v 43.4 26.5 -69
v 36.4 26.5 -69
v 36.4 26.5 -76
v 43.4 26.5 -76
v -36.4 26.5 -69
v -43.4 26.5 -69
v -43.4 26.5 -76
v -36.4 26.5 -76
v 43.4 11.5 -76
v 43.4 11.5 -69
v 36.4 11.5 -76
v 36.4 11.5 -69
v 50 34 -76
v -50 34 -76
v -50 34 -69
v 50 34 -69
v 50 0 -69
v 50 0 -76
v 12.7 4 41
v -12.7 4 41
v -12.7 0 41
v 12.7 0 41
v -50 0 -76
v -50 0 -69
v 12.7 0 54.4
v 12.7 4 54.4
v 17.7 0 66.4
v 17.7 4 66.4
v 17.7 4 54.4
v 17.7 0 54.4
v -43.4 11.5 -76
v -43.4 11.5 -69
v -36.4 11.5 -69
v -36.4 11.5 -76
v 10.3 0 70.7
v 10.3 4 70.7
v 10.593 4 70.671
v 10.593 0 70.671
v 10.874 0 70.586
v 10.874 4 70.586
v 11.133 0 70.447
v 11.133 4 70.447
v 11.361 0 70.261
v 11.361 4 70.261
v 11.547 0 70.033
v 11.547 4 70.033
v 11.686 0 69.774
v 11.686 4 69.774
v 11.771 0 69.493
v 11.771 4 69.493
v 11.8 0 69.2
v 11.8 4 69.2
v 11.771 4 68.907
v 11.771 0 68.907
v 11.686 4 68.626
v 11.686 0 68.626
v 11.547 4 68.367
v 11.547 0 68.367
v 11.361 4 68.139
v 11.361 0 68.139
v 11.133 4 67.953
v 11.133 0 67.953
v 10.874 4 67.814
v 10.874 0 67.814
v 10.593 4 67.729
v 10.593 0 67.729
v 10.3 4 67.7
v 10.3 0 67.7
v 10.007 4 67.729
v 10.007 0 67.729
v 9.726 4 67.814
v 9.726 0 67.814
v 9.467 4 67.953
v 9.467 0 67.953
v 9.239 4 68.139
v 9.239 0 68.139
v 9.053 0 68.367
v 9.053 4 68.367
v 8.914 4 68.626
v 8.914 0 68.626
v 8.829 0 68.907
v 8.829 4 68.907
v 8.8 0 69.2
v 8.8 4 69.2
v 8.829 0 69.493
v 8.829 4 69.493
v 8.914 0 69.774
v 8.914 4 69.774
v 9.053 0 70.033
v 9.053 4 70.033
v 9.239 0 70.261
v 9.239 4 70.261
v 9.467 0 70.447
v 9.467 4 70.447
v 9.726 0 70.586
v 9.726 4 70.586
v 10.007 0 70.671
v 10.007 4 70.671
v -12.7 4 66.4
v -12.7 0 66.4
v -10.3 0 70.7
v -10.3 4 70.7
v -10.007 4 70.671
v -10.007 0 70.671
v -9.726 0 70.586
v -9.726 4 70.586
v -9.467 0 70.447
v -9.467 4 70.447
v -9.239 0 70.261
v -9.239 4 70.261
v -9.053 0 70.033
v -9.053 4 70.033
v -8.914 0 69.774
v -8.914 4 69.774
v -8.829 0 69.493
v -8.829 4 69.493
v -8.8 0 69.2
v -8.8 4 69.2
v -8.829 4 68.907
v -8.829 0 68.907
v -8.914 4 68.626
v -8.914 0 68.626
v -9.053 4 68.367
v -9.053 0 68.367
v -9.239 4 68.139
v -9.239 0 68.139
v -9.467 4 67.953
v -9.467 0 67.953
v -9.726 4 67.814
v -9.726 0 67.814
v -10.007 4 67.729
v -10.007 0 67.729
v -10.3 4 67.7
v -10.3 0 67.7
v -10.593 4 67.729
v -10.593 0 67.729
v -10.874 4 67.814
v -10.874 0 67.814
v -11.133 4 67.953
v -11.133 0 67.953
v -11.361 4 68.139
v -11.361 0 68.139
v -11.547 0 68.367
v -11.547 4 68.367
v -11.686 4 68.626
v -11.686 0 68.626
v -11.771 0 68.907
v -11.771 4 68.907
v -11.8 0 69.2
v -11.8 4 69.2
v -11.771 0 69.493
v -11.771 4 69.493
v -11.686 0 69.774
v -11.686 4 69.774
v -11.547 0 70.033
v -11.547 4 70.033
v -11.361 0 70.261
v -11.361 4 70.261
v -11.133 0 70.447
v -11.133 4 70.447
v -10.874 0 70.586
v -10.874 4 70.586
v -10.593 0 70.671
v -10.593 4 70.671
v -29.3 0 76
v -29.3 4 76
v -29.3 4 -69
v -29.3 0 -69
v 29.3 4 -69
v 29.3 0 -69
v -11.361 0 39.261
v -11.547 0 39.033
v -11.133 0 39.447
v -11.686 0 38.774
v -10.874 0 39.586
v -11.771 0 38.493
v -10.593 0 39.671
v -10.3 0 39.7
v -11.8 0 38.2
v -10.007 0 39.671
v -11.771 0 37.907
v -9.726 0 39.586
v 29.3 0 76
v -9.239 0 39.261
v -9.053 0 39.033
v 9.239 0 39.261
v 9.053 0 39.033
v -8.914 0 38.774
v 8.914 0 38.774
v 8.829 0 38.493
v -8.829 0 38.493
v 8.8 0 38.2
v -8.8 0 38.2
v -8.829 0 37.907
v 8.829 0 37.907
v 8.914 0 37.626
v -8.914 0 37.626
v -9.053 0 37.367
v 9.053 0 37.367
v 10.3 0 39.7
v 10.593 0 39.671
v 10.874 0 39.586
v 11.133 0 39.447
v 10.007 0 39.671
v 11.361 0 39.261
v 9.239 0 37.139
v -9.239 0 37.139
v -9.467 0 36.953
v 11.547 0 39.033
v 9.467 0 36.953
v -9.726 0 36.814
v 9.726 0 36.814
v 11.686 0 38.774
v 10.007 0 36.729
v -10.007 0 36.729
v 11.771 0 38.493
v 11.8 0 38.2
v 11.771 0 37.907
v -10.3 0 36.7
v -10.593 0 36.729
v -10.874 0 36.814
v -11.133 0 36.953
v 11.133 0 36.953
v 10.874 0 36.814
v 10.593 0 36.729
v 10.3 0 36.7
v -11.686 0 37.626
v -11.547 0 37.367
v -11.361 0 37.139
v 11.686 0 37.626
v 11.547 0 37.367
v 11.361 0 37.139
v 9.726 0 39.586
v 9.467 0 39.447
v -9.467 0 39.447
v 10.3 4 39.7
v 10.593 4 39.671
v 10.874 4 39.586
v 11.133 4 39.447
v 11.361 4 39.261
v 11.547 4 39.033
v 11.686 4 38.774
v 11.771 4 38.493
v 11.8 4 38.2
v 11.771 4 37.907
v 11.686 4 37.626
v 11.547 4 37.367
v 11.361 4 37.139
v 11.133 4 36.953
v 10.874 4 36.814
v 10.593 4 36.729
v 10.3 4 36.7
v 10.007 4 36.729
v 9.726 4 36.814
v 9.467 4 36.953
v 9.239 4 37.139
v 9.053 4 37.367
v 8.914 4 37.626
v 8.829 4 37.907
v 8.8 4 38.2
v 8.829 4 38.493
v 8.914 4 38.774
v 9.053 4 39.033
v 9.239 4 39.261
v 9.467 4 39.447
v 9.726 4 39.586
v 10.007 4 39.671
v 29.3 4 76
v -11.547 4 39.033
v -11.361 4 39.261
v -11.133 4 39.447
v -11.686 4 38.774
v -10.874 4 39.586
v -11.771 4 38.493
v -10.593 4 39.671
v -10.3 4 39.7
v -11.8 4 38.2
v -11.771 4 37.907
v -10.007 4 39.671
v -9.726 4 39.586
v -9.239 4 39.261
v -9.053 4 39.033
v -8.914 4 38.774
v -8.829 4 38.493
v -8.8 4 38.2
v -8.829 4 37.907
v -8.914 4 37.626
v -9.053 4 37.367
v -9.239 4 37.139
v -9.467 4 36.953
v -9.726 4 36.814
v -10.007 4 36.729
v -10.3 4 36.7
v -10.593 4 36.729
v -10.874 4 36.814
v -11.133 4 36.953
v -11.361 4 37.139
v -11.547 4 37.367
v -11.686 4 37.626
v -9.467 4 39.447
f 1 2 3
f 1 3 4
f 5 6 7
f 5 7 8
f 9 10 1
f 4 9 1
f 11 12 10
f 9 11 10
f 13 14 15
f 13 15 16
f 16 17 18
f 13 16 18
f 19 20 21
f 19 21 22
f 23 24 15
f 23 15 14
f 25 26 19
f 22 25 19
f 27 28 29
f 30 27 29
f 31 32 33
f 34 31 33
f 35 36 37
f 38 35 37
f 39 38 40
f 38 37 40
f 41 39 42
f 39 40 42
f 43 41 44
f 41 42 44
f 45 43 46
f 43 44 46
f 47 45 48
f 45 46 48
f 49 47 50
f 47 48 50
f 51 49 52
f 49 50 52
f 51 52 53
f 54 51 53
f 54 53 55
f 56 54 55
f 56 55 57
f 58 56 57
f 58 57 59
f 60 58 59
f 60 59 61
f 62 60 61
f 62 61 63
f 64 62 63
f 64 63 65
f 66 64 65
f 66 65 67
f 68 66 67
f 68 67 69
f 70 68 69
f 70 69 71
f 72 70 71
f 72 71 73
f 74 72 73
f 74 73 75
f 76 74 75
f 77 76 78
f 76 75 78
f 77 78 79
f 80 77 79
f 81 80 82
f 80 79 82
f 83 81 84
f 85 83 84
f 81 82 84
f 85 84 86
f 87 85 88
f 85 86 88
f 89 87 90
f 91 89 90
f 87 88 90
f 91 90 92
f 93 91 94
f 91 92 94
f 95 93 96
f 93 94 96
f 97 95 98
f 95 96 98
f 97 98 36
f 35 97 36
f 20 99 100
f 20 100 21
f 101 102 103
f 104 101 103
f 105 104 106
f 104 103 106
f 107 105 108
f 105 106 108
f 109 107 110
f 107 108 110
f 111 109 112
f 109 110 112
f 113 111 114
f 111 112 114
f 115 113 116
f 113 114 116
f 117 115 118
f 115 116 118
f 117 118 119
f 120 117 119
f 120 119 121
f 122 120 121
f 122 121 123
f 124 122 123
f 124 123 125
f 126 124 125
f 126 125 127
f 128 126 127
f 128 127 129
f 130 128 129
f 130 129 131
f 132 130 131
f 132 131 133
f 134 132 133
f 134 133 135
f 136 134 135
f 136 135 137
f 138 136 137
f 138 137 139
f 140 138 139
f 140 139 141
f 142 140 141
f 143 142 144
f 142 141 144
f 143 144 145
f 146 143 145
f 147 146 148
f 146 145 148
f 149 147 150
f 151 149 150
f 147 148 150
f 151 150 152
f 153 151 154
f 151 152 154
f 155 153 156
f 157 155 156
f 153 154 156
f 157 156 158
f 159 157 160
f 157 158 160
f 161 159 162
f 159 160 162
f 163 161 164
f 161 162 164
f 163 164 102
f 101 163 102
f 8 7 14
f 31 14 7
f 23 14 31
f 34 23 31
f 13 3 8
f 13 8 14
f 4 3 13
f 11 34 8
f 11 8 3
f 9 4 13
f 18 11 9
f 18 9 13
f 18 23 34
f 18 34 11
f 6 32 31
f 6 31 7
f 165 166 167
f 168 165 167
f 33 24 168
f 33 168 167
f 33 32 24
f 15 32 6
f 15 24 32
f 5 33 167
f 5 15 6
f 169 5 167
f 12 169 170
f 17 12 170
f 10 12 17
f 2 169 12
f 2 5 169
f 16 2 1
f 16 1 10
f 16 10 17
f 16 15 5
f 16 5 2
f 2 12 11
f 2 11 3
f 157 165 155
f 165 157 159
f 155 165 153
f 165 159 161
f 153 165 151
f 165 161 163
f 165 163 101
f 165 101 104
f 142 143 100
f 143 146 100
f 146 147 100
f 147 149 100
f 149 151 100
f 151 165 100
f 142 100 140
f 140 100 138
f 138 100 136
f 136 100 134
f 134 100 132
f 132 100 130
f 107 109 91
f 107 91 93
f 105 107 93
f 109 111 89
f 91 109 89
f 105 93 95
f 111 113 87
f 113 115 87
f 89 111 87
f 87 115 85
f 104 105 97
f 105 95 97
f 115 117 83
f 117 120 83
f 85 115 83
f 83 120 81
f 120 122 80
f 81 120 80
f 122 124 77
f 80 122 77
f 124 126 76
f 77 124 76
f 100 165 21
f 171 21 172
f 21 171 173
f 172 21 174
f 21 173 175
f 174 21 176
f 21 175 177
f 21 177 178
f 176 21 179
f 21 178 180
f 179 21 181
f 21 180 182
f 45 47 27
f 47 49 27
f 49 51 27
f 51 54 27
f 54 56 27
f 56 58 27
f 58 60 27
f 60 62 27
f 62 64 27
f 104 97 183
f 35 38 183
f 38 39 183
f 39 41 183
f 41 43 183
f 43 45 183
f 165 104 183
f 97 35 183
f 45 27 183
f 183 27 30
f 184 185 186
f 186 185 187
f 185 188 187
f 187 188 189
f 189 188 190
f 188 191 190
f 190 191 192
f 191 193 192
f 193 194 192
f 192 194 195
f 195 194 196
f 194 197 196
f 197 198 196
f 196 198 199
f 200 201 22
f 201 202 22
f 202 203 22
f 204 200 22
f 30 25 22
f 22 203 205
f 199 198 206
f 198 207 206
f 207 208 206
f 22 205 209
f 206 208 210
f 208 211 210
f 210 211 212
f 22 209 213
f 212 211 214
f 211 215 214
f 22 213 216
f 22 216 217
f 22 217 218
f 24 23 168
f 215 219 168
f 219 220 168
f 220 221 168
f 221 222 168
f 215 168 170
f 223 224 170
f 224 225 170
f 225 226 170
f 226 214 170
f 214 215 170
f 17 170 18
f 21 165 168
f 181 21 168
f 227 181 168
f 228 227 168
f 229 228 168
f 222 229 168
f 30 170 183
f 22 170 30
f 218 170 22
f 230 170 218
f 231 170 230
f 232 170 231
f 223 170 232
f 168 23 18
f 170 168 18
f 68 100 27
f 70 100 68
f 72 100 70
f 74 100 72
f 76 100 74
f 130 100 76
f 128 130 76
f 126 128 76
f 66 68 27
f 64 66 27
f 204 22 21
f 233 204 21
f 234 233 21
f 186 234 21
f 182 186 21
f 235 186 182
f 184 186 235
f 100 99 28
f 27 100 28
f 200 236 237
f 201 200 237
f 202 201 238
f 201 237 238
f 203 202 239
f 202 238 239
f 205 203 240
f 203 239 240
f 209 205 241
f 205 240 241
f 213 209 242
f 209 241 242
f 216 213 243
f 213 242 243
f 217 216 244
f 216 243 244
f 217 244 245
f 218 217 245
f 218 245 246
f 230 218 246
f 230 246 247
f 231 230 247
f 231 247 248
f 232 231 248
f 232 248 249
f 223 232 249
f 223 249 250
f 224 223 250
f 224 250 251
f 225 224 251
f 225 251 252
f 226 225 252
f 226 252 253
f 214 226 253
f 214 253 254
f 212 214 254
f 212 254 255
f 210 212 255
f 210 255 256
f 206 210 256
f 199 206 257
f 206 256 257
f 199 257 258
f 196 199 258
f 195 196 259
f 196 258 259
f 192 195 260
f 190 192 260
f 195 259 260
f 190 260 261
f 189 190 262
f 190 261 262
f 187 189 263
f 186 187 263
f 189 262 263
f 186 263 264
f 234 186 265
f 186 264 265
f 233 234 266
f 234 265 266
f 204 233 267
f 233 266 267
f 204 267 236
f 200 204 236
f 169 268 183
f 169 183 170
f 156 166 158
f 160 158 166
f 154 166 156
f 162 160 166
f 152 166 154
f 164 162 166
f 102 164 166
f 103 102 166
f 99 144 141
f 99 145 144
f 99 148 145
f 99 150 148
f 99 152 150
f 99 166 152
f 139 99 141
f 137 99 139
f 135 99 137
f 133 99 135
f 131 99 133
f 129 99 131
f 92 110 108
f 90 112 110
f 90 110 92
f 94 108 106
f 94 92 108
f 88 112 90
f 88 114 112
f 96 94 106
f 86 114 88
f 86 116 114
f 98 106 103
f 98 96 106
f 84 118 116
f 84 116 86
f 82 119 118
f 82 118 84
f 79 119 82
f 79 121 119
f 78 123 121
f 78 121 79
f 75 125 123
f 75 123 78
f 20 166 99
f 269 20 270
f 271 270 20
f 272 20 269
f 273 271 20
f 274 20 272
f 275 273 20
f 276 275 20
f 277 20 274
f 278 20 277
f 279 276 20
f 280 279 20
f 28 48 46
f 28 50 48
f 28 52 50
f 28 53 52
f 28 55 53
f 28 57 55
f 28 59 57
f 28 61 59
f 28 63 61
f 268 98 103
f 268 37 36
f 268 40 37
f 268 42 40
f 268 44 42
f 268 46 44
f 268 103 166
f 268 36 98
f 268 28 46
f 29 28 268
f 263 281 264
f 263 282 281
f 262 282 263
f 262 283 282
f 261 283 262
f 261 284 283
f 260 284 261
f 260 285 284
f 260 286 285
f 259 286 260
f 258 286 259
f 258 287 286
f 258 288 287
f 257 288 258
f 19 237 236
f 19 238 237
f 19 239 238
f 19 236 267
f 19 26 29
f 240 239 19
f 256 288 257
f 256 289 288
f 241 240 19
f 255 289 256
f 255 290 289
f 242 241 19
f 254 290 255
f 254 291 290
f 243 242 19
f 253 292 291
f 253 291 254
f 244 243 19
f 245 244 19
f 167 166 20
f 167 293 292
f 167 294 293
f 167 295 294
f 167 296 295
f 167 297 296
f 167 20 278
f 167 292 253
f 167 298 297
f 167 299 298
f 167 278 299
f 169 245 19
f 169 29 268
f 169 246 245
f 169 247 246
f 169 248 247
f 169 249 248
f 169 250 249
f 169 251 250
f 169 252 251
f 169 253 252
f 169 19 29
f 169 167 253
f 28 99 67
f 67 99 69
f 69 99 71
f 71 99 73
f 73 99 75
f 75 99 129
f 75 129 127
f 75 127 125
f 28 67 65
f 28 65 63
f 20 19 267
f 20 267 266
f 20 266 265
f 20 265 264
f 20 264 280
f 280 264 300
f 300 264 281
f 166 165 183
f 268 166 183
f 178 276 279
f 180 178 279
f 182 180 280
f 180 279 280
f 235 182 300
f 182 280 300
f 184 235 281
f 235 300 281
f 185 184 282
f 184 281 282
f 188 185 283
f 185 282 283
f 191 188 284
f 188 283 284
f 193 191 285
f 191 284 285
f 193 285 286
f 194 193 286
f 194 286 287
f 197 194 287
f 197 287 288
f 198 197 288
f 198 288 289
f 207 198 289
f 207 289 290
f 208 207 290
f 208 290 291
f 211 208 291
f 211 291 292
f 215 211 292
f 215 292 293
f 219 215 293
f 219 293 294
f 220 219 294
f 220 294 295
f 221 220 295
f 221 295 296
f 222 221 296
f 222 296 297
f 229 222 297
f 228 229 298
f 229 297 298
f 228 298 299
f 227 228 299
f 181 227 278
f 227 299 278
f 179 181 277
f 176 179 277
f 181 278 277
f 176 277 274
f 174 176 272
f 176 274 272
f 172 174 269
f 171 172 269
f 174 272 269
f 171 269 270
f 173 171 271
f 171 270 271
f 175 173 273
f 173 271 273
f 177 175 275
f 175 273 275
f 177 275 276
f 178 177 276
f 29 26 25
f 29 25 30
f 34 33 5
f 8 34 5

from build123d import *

# Parameters (mm, degrees)
SKETCH1_W           = 100
SKETCH1_H           = 152
BOSS_EXTRUDE1_DEPTH = 34
SKETCH2_W           = 100
SKETCH2_H           = 145
CUT_EXTRUDE1_DEPTH  = 30
SKETCH3_W           = 7
SKETCH3_H           = 15
CUT_EXTRUDE2_DEPTH  = 158.101877774
SKETCH4_W           = 20.7
SKETCH4_H           = 145
CUT_EXTRUDE3_DEPTH  = 96.791440119
SKETCH5_W           = 25.4
SKETCH5_H           = 25.4
CUT_EXTRUDE4_DEPTH  = 96.791440119
SKETCH7_R           = 1.5
CUT_EXTRUDE5_DEPTH  = 96.791440119
SKETCH8_W           = 5
SKETCH8_H           = 12
CUT_EXTRUDE6_DEPTH  = 96.791440119


with BuildPart() as part:
    # Sketch1 → Boss-Extrude1 (new body)
    with BuildSketch(Plane(origin=(0, 0, 0), x_dir=(1, 0, 0), z_dir=(0, 1, 0))):
        Rectangle(SKETCH1_W, SKETCH1_H)
    extrude(amount=BOSS_EXTRUDE1_DEPTH)

    # Sketch2 → Cut-Extrude1 (cut)
    with BuildSketch(Plane(origin=(0, 34, 0), x_dir=(1, 0, 0), z_dir=(0, 1, 0))):
        with Locations((0, -3.5)):
            Rectangle(SKETCH2_W, SKETCH2_H)
    extrude(amount=-CUT_EXTRUDE1_DEPTH, mode=Mode.SUBTRACT)

    # Sketch3 → Cut-Extrude2 (cut, through all)
    with BuildSketch(Plane.XY.offset(-69)):
        with Locations((-39.9, 19)):
            Rectangle(SKETCH3_W, SKETCH3_H)
        with Locations((39.9, 19)):
            Rectangle(SKETCH3_W, SKETCH3_H)
    extrude(amount=-CUT_EXTRUDE2_DEPTH, mode=Mode.SUBTRACT)

    # Sketch4 → Cut-Extrude3 (cut, through all)
    with BuildSketch(Plane(origin=(0, 4, 0), x_dir=(1, 0, 0), z_dir=(0, 1, 0))):
        with Locations((-39.65, -3.5)):
            Rectangle(SKETCH4_W, SKETCH4_H)
        with Locations((39.65, -3.5)):
            Rectangle(SKETCH4_W, SKETCH4_H)
    extrude(amount=-CUT_EXTRUDE3_DEPTH, mode=Mode.SUBTRACT)

    # Sketch5 → Cut-Extrude4 (cut, through all)
    with BuildSketch(Plane(origin=(0, 4, 0), x_dir=(1, 0, 0), z_dir=(0, 1, 0))):
        with Locations((0, -53.7)):
            Rectangle(SKETCH5_W, SKETCH5_H)
    extrude(amount=-CUT_EXTRUDE4_DEPTH, mode=Mode.SUBTRACT)

    # Sketch7 → Cut-Extrude5 (cut, through all)
    with BuildSketch(Plane(origin=(0, 4, 0), x_dir=(1, 0, 0), z_dir=(0, 1, 0))):
        with Locations(Location((-10.3, -38.2, 0), (0, 0, 270))):
            Circle(SKETCH7_R)
        with Locations(Location((10.3, -38.2, 0), (0, 0, 270))):
            Circle(SKETCH7_R)
        with Locations(Location((10.3, -69.2, 0), (0, 0, 270))):
            Circle(SKETCH7_R)
        with Locations(Location((-10.3, -69.2, 0), (0, 0, 270))):
            Circle(SKETCH7_R)
    extrude(amount=-CUT_EXTRUDE5_DEPTH, mode=Mode.SUBTRACT)

    # Sketch8 → Cut-Extrude6 (cut, through all)
    with BuildSketch(Plane(origin=(0, 4, 0), x_dir=(1, 0, 0), z_dir=(0, 1, 0))):
        with Locations((15.2, -60.4)):
            Rectangle(SKETCH8_W, SKETCH8_H)
    extrude(amount=-CUT_EXTRUDE6_DEPTH, mode=Mode.SUBTRACT)


solid = part.part
